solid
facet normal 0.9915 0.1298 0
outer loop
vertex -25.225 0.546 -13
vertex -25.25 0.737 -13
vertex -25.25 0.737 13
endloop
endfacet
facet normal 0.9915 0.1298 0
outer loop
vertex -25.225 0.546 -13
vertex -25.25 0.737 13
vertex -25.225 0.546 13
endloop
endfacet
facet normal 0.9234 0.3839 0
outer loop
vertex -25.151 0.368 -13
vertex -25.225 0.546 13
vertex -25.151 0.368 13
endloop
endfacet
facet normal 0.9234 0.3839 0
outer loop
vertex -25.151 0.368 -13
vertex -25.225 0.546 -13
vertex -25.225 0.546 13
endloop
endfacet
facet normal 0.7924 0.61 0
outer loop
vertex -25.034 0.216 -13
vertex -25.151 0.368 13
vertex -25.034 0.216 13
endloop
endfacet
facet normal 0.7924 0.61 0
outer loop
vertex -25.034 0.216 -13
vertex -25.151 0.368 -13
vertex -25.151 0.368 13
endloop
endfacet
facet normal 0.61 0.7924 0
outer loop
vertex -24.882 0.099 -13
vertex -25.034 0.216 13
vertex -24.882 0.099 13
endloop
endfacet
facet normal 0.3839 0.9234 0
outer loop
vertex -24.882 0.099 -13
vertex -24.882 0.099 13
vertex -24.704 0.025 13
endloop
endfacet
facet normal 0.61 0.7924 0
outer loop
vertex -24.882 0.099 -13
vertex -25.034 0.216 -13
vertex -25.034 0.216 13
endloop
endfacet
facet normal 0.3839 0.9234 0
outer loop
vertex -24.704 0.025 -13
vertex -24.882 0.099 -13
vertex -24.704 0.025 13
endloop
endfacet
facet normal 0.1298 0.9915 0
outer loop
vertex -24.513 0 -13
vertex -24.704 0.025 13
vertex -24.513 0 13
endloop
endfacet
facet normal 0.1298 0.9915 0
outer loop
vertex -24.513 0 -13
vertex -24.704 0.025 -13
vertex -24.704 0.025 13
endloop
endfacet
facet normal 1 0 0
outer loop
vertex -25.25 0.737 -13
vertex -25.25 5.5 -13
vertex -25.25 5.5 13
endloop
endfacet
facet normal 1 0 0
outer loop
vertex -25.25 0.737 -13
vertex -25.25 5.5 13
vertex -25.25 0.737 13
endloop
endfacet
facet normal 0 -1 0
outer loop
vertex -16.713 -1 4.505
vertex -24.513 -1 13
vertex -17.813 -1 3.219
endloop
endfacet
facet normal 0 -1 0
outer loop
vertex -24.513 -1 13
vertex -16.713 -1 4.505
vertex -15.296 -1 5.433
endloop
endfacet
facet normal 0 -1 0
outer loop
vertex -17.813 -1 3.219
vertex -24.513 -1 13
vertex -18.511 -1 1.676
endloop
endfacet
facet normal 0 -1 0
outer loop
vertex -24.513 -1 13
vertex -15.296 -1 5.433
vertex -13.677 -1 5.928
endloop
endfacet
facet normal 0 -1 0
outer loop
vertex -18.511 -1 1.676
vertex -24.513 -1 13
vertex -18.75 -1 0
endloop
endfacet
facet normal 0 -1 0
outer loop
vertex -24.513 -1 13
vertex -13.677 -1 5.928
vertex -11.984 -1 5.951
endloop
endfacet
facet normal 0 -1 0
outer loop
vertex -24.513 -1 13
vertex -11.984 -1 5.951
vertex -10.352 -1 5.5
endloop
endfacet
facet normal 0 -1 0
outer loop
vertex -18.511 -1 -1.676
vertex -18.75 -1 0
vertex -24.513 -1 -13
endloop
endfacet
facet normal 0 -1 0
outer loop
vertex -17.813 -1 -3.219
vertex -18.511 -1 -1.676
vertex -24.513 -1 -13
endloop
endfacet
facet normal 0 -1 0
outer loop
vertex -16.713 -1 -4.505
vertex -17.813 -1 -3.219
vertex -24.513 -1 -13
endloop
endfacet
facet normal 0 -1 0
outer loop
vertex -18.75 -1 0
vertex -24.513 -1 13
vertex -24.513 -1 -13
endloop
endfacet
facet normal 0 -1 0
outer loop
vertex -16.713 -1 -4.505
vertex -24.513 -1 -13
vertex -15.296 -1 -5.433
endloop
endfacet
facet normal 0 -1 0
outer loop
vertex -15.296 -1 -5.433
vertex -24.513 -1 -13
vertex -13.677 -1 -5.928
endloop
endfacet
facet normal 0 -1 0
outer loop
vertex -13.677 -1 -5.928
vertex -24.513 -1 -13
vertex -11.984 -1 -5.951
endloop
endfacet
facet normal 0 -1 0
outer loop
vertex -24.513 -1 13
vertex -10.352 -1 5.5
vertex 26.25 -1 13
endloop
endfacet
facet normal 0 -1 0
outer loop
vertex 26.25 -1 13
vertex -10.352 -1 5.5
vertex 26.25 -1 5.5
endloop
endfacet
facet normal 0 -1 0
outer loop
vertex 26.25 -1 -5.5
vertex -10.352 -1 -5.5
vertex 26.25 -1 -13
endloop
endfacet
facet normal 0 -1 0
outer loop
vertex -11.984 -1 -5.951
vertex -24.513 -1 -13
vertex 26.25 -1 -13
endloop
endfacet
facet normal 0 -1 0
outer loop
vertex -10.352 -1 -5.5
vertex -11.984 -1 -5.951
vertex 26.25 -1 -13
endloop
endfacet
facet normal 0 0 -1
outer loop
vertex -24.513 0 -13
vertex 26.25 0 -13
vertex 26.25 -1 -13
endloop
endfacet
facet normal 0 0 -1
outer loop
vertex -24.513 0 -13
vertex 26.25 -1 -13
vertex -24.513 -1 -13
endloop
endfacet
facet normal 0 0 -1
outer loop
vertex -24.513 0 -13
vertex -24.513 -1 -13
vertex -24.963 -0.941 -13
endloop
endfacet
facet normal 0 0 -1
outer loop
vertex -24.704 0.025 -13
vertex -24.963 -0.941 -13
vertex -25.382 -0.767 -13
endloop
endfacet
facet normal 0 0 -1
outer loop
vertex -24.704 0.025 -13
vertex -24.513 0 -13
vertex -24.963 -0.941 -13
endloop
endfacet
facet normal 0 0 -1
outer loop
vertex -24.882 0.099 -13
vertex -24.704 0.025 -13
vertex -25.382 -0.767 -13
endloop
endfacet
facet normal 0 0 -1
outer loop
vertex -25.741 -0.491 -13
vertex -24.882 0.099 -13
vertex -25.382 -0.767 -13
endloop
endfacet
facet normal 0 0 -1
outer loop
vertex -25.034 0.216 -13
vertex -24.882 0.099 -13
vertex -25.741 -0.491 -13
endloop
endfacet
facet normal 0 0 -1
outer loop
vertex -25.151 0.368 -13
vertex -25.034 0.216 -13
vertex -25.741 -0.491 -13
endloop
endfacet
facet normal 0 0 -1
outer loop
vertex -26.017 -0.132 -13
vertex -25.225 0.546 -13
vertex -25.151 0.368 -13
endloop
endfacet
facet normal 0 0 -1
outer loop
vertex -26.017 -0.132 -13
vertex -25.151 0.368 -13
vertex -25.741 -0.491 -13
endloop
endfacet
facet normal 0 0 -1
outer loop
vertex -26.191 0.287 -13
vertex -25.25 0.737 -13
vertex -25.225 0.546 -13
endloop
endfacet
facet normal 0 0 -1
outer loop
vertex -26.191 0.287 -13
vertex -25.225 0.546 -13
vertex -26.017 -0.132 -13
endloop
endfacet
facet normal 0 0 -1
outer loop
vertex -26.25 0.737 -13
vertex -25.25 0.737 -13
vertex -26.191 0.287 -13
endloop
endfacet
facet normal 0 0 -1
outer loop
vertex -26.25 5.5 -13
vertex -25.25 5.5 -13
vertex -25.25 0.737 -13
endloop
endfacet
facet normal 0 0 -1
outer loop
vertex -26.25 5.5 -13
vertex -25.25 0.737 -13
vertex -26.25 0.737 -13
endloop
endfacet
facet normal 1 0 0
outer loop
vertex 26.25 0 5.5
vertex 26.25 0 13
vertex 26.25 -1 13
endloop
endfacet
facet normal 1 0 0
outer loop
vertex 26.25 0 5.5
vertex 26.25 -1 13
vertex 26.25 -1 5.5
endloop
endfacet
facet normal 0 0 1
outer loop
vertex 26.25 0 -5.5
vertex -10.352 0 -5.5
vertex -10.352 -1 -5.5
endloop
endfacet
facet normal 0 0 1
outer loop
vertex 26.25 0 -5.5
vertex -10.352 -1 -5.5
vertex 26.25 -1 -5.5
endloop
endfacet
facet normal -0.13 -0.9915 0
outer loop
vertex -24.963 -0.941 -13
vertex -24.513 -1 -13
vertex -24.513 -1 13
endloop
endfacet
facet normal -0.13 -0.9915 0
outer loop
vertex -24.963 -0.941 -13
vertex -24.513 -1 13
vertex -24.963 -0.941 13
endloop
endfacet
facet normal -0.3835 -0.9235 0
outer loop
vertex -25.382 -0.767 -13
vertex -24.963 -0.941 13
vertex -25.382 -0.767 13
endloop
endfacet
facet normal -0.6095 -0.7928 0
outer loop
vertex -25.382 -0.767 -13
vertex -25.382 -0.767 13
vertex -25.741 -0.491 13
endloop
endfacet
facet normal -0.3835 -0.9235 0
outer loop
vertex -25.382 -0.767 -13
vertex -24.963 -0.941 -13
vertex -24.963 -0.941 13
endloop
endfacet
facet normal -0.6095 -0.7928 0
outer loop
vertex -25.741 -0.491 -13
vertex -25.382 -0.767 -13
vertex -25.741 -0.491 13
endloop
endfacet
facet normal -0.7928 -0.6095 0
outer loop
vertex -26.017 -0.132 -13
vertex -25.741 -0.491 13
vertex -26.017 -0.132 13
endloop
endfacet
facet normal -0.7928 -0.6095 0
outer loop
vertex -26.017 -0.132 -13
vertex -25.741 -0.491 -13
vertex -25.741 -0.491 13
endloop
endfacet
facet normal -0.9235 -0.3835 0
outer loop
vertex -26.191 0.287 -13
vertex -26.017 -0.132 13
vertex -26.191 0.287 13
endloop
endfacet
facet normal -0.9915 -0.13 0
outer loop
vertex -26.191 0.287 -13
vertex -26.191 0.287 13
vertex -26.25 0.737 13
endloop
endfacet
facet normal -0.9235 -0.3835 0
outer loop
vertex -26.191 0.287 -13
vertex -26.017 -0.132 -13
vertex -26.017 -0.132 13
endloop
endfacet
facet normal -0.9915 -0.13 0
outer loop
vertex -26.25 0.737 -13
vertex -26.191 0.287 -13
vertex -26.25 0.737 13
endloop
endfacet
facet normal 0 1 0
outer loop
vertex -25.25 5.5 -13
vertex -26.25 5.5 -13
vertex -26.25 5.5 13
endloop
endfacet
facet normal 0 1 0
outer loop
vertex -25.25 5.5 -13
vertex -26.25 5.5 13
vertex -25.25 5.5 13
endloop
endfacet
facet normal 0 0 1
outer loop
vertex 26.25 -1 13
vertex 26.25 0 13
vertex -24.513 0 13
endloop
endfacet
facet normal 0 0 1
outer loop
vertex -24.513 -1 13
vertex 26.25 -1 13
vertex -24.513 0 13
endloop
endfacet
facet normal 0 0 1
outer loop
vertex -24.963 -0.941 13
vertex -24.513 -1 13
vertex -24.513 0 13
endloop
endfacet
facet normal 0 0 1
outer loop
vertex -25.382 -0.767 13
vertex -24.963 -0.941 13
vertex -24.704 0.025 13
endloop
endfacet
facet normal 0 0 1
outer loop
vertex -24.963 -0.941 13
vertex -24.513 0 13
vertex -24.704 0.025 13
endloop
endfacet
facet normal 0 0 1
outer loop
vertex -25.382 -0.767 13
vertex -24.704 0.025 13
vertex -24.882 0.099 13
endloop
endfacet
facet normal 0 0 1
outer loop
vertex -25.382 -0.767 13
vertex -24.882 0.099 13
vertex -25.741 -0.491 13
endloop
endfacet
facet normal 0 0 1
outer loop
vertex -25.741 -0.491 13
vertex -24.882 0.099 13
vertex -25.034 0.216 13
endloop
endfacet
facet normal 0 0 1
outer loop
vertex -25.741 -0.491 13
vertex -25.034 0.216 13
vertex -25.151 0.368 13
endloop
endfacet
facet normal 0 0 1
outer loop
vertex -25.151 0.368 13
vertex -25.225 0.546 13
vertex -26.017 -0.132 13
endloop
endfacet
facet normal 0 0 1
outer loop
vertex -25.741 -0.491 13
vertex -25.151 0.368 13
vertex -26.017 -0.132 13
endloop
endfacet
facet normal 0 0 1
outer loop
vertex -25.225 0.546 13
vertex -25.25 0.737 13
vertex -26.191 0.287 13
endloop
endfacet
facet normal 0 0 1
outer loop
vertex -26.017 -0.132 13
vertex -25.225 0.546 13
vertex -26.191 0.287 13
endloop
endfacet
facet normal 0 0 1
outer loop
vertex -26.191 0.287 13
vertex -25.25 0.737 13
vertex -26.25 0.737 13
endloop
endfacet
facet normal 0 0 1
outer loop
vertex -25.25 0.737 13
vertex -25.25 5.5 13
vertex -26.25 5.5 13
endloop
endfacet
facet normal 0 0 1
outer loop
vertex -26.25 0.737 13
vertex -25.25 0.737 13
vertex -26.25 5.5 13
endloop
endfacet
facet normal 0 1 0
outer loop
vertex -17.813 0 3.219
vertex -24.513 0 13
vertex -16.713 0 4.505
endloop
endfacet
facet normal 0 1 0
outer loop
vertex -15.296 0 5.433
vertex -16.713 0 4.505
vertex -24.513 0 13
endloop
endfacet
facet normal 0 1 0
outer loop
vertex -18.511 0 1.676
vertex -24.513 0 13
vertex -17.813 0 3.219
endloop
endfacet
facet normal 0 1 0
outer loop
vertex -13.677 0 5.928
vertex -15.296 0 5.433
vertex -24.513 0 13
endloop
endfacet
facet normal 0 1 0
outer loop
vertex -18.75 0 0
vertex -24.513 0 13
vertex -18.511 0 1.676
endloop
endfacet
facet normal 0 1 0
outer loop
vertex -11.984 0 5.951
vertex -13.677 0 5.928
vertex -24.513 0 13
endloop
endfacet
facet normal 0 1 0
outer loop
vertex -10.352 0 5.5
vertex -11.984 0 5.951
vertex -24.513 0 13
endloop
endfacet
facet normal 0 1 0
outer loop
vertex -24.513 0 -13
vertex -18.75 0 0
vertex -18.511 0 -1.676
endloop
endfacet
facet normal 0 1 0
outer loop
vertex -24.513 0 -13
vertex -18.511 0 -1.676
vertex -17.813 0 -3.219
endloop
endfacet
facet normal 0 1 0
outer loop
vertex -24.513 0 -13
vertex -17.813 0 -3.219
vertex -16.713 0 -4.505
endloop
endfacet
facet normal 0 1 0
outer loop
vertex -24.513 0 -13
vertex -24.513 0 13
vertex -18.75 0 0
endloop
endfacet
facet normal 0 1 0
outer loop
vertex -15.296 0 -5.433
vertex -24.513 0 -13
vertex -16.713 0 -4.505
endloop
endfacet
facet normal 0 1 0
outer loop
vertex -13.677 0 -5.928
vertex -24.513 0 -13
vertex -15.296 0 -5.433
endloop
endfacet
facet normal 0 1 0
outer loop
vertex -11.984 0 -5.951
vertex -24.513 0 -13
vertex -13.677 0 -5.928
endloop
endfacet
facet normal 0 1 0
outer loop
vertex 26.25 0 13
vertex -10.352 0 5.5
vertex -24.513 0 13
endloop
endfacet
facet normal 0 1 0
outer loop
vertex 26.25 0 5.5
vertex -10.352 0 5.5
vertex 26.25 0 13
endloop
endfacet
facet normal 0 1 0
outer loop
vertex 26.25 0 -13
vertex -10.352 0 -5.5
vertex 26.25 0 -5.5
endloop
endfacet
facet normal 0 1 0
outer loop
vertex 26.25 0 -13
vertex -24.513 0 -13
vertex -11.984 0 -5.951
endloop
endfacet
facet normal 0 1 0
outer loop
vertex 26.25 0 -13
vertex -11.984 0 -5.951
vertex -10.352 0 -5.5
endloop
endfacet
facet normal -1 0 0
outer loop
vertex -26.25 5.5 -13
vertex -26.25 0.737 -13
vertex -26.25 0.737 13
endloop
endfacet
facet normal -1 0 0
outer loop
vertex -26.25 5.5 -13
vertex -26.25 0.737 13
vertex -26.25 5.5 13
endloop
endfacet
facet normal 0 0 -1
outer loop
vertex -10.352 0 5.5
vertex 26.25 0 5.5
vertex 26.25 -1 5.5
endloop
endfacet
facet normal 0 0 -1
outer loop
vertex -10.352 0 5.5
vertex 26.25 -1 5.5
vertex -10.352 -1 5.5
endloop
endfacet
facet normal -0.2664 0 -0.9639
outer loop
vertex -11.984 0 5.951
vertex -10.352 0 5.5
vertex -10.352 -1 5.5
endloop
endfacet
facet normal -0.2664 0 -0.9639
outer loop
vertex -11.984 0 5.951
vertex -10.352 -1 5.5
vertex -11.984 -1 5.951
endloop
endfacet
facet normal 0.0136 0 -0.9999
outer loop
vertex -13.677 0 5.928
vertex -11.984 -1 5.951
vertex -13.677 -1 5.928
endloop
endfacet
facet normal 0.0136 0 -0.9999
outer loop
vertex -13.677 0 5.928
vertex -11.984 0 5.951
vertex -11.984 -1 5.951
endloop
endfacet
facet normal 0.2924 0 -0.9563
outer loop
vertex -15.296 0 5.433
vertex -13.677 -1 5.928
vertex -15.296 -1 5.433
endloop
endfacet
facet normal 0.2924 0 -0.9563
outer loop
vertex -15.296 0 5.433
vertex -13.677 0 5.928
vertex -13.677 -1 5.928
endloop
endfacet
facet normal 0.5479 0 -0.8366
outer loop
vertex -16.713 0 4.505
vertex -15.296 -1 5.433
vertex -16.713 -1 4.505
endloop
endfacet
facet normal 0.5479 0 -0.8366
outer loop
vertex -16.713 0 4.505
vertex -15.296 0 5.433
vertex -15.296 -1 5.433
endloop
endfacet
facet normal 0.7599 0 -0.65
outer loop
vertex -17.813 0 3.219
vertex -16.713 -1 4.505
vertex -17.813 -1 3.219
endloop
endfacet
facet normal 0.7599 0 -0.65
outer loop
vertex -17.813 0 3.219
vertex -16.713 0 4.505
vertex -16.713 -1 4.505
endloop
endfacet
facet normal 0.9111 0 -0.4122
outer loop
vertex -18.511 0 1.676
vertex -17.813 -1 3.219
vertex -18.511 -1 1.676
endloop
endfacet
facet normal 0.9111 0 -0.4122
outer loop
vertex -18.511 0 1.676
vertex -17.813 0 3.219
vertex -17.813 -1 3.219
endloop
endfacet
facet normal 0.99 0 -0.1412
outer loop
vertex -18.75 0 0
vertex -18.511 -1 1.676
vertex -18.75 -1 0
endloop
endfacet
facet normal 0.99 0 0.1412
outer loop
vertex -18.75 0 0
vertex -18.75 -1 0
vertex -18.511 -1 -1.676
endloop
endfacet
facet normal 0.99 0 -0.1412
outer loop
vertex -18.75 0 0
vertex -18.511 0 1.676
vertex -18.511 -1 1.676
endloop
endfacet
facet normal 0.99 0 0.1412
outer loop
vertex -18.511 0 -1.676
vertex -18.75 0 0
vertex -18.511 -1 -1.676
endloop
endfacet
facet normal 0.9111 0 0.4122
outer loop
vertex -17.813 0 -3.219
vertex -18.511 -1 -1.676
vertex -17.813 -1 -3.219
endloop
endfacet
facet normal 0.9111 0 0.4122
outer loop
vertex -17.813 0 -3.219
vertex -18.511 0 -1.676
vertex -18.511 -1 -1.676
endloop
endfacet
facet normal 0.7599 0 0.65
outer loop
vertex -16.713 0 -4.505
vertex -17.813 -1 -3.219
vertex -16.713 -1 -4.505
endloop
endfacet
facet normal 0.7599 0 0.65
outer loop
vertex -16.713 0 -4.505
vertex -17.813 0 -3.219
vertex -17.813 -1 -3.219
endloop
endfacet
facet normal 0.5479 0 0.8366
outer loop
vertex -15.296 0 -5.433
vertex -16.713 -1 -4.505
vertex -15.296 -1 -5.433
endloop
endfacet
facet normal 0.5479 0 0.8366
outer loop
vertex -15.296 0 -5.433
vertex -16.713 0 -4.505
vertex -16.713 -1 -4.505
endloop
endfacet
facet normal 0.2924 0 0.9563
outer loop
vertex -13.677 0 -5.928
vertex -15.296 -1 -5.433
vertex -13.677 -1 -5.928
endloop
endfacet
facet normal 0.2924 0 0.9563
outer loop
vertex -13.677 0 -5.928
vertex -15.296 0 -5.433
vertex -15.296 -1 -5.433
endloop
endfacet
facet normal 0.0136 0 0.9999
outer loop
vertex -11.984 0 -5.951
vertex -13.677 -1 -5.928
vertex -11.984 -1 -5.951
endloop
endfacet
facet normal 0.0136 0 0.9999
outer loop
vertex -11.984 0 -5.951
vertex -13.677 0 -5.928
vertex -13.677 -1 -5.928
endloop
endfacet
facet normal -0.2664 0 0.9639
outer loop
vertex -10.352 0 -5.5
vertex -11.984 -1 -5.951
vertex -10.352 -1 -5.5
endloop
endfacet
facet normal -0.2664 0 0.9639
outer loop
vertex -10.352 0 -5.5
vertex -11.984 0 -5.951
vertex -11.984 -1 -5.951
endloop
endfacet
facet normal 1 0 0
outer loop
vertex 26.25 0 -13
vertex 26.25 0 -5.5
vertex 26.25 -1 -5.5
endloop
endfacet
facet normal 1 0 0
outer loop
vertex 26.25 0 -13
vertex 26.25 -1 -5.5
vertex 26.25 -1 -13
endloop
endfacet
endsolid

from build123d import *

# Parameters (mm, degrees)
T_LE_DE_BASE_PLI_E1_DEPTH             = 1
T_LE_PLI_E_SUR_AR_TE1_STRIP_W         = 5.4732
T_LE_PLI_E_SUR_AR_TE1_STRIP_H         = 1
T_LE_PLI_E_SUR_AR_TE1_STRIP_CUT_DEPTH = 26
T_LE_PLI_E_SUR_AR_TE1_DEPTH           = 26


# Sheet-metal steps are written as plain solids
with BuildPart() as part:
    # Esquisse1 → Tôle de base pliée1 (new body)
    with BuildSketch(Plane(origin=(0, 0, 0), x_dir=(1, 0, 0), z_dir=(0, 1, 0))):
        with BuildLine():
            Line((-26.25, -13), (26.25, -13))
            Line((26.25, -13), (26.25, -5.5))
            Line((26.25, -5.5), (-10.352084238, -5.5))
            ThreePointArc((-10.352084238, -5.5), (-18.75, 0), (-10.352084238, 5.5))
            Line((-10.352084238, 5.5), (26.25, 5.5))
            Line((26.25, 5.5), (26.25, 13))
            Line((26.25, 13), (-26.25, 13))
            Line((-26.25, 13), (-26.25, -13))
        make_face()
    extrude(amount=-T_LE_DE_BASE_PLI_E1_DEPTH)

    # Tôle pliée sur arête1 strip (across the edge) → Tôle pliée sur arête1 strip cut (cut)
    with BuildSketch(Plane(origin=(-26.25, 0, -13), x_dir=(1, 0, 0), z_dir=(0, 0, 1))):
        with Locations((-1, -0.5)):
            Rectangle(T_LE_PLI_E_SUR_AR_TE1_STRIP_W, T_LE_PLI_E_SUR_AR_TE1_STRIP_H)
    extrude(amount=T_LE_PLI_E_SUR_AR_TE1_STRIP_CUT_DEPTH, mode=Mode.SUBTRACT)

    # Tôle pliée sur arête1 section (across the edge) → Tôle pliée sur arête1 (add)
    with BuildSketch(Plane(origin=(-26.25, 0, -13), x_dir=(1, 0, 0), z_dir=(0, 0, 1))):
        with BuildLine():
            Line((0, 0.7366), (0, 5.5))
            Line((0, 5.5), (1, 5.5))
            Line((1, 5.5), (1, 0.7366))
            ThreePointArc((1, 0.7366), (1.215745145, 0.215745145), (1.7366, 0))
            Line((1.7366, 0), (1.7366, -1))
            ThreePointArc((1.7366, -1), (0.508638364, -0.491361636), (0, 0.7366))
        make_face()
    extrude(amount=T_LE_PLI_E_SUR_AR_TE1_DEPTH)


solid = part.part
